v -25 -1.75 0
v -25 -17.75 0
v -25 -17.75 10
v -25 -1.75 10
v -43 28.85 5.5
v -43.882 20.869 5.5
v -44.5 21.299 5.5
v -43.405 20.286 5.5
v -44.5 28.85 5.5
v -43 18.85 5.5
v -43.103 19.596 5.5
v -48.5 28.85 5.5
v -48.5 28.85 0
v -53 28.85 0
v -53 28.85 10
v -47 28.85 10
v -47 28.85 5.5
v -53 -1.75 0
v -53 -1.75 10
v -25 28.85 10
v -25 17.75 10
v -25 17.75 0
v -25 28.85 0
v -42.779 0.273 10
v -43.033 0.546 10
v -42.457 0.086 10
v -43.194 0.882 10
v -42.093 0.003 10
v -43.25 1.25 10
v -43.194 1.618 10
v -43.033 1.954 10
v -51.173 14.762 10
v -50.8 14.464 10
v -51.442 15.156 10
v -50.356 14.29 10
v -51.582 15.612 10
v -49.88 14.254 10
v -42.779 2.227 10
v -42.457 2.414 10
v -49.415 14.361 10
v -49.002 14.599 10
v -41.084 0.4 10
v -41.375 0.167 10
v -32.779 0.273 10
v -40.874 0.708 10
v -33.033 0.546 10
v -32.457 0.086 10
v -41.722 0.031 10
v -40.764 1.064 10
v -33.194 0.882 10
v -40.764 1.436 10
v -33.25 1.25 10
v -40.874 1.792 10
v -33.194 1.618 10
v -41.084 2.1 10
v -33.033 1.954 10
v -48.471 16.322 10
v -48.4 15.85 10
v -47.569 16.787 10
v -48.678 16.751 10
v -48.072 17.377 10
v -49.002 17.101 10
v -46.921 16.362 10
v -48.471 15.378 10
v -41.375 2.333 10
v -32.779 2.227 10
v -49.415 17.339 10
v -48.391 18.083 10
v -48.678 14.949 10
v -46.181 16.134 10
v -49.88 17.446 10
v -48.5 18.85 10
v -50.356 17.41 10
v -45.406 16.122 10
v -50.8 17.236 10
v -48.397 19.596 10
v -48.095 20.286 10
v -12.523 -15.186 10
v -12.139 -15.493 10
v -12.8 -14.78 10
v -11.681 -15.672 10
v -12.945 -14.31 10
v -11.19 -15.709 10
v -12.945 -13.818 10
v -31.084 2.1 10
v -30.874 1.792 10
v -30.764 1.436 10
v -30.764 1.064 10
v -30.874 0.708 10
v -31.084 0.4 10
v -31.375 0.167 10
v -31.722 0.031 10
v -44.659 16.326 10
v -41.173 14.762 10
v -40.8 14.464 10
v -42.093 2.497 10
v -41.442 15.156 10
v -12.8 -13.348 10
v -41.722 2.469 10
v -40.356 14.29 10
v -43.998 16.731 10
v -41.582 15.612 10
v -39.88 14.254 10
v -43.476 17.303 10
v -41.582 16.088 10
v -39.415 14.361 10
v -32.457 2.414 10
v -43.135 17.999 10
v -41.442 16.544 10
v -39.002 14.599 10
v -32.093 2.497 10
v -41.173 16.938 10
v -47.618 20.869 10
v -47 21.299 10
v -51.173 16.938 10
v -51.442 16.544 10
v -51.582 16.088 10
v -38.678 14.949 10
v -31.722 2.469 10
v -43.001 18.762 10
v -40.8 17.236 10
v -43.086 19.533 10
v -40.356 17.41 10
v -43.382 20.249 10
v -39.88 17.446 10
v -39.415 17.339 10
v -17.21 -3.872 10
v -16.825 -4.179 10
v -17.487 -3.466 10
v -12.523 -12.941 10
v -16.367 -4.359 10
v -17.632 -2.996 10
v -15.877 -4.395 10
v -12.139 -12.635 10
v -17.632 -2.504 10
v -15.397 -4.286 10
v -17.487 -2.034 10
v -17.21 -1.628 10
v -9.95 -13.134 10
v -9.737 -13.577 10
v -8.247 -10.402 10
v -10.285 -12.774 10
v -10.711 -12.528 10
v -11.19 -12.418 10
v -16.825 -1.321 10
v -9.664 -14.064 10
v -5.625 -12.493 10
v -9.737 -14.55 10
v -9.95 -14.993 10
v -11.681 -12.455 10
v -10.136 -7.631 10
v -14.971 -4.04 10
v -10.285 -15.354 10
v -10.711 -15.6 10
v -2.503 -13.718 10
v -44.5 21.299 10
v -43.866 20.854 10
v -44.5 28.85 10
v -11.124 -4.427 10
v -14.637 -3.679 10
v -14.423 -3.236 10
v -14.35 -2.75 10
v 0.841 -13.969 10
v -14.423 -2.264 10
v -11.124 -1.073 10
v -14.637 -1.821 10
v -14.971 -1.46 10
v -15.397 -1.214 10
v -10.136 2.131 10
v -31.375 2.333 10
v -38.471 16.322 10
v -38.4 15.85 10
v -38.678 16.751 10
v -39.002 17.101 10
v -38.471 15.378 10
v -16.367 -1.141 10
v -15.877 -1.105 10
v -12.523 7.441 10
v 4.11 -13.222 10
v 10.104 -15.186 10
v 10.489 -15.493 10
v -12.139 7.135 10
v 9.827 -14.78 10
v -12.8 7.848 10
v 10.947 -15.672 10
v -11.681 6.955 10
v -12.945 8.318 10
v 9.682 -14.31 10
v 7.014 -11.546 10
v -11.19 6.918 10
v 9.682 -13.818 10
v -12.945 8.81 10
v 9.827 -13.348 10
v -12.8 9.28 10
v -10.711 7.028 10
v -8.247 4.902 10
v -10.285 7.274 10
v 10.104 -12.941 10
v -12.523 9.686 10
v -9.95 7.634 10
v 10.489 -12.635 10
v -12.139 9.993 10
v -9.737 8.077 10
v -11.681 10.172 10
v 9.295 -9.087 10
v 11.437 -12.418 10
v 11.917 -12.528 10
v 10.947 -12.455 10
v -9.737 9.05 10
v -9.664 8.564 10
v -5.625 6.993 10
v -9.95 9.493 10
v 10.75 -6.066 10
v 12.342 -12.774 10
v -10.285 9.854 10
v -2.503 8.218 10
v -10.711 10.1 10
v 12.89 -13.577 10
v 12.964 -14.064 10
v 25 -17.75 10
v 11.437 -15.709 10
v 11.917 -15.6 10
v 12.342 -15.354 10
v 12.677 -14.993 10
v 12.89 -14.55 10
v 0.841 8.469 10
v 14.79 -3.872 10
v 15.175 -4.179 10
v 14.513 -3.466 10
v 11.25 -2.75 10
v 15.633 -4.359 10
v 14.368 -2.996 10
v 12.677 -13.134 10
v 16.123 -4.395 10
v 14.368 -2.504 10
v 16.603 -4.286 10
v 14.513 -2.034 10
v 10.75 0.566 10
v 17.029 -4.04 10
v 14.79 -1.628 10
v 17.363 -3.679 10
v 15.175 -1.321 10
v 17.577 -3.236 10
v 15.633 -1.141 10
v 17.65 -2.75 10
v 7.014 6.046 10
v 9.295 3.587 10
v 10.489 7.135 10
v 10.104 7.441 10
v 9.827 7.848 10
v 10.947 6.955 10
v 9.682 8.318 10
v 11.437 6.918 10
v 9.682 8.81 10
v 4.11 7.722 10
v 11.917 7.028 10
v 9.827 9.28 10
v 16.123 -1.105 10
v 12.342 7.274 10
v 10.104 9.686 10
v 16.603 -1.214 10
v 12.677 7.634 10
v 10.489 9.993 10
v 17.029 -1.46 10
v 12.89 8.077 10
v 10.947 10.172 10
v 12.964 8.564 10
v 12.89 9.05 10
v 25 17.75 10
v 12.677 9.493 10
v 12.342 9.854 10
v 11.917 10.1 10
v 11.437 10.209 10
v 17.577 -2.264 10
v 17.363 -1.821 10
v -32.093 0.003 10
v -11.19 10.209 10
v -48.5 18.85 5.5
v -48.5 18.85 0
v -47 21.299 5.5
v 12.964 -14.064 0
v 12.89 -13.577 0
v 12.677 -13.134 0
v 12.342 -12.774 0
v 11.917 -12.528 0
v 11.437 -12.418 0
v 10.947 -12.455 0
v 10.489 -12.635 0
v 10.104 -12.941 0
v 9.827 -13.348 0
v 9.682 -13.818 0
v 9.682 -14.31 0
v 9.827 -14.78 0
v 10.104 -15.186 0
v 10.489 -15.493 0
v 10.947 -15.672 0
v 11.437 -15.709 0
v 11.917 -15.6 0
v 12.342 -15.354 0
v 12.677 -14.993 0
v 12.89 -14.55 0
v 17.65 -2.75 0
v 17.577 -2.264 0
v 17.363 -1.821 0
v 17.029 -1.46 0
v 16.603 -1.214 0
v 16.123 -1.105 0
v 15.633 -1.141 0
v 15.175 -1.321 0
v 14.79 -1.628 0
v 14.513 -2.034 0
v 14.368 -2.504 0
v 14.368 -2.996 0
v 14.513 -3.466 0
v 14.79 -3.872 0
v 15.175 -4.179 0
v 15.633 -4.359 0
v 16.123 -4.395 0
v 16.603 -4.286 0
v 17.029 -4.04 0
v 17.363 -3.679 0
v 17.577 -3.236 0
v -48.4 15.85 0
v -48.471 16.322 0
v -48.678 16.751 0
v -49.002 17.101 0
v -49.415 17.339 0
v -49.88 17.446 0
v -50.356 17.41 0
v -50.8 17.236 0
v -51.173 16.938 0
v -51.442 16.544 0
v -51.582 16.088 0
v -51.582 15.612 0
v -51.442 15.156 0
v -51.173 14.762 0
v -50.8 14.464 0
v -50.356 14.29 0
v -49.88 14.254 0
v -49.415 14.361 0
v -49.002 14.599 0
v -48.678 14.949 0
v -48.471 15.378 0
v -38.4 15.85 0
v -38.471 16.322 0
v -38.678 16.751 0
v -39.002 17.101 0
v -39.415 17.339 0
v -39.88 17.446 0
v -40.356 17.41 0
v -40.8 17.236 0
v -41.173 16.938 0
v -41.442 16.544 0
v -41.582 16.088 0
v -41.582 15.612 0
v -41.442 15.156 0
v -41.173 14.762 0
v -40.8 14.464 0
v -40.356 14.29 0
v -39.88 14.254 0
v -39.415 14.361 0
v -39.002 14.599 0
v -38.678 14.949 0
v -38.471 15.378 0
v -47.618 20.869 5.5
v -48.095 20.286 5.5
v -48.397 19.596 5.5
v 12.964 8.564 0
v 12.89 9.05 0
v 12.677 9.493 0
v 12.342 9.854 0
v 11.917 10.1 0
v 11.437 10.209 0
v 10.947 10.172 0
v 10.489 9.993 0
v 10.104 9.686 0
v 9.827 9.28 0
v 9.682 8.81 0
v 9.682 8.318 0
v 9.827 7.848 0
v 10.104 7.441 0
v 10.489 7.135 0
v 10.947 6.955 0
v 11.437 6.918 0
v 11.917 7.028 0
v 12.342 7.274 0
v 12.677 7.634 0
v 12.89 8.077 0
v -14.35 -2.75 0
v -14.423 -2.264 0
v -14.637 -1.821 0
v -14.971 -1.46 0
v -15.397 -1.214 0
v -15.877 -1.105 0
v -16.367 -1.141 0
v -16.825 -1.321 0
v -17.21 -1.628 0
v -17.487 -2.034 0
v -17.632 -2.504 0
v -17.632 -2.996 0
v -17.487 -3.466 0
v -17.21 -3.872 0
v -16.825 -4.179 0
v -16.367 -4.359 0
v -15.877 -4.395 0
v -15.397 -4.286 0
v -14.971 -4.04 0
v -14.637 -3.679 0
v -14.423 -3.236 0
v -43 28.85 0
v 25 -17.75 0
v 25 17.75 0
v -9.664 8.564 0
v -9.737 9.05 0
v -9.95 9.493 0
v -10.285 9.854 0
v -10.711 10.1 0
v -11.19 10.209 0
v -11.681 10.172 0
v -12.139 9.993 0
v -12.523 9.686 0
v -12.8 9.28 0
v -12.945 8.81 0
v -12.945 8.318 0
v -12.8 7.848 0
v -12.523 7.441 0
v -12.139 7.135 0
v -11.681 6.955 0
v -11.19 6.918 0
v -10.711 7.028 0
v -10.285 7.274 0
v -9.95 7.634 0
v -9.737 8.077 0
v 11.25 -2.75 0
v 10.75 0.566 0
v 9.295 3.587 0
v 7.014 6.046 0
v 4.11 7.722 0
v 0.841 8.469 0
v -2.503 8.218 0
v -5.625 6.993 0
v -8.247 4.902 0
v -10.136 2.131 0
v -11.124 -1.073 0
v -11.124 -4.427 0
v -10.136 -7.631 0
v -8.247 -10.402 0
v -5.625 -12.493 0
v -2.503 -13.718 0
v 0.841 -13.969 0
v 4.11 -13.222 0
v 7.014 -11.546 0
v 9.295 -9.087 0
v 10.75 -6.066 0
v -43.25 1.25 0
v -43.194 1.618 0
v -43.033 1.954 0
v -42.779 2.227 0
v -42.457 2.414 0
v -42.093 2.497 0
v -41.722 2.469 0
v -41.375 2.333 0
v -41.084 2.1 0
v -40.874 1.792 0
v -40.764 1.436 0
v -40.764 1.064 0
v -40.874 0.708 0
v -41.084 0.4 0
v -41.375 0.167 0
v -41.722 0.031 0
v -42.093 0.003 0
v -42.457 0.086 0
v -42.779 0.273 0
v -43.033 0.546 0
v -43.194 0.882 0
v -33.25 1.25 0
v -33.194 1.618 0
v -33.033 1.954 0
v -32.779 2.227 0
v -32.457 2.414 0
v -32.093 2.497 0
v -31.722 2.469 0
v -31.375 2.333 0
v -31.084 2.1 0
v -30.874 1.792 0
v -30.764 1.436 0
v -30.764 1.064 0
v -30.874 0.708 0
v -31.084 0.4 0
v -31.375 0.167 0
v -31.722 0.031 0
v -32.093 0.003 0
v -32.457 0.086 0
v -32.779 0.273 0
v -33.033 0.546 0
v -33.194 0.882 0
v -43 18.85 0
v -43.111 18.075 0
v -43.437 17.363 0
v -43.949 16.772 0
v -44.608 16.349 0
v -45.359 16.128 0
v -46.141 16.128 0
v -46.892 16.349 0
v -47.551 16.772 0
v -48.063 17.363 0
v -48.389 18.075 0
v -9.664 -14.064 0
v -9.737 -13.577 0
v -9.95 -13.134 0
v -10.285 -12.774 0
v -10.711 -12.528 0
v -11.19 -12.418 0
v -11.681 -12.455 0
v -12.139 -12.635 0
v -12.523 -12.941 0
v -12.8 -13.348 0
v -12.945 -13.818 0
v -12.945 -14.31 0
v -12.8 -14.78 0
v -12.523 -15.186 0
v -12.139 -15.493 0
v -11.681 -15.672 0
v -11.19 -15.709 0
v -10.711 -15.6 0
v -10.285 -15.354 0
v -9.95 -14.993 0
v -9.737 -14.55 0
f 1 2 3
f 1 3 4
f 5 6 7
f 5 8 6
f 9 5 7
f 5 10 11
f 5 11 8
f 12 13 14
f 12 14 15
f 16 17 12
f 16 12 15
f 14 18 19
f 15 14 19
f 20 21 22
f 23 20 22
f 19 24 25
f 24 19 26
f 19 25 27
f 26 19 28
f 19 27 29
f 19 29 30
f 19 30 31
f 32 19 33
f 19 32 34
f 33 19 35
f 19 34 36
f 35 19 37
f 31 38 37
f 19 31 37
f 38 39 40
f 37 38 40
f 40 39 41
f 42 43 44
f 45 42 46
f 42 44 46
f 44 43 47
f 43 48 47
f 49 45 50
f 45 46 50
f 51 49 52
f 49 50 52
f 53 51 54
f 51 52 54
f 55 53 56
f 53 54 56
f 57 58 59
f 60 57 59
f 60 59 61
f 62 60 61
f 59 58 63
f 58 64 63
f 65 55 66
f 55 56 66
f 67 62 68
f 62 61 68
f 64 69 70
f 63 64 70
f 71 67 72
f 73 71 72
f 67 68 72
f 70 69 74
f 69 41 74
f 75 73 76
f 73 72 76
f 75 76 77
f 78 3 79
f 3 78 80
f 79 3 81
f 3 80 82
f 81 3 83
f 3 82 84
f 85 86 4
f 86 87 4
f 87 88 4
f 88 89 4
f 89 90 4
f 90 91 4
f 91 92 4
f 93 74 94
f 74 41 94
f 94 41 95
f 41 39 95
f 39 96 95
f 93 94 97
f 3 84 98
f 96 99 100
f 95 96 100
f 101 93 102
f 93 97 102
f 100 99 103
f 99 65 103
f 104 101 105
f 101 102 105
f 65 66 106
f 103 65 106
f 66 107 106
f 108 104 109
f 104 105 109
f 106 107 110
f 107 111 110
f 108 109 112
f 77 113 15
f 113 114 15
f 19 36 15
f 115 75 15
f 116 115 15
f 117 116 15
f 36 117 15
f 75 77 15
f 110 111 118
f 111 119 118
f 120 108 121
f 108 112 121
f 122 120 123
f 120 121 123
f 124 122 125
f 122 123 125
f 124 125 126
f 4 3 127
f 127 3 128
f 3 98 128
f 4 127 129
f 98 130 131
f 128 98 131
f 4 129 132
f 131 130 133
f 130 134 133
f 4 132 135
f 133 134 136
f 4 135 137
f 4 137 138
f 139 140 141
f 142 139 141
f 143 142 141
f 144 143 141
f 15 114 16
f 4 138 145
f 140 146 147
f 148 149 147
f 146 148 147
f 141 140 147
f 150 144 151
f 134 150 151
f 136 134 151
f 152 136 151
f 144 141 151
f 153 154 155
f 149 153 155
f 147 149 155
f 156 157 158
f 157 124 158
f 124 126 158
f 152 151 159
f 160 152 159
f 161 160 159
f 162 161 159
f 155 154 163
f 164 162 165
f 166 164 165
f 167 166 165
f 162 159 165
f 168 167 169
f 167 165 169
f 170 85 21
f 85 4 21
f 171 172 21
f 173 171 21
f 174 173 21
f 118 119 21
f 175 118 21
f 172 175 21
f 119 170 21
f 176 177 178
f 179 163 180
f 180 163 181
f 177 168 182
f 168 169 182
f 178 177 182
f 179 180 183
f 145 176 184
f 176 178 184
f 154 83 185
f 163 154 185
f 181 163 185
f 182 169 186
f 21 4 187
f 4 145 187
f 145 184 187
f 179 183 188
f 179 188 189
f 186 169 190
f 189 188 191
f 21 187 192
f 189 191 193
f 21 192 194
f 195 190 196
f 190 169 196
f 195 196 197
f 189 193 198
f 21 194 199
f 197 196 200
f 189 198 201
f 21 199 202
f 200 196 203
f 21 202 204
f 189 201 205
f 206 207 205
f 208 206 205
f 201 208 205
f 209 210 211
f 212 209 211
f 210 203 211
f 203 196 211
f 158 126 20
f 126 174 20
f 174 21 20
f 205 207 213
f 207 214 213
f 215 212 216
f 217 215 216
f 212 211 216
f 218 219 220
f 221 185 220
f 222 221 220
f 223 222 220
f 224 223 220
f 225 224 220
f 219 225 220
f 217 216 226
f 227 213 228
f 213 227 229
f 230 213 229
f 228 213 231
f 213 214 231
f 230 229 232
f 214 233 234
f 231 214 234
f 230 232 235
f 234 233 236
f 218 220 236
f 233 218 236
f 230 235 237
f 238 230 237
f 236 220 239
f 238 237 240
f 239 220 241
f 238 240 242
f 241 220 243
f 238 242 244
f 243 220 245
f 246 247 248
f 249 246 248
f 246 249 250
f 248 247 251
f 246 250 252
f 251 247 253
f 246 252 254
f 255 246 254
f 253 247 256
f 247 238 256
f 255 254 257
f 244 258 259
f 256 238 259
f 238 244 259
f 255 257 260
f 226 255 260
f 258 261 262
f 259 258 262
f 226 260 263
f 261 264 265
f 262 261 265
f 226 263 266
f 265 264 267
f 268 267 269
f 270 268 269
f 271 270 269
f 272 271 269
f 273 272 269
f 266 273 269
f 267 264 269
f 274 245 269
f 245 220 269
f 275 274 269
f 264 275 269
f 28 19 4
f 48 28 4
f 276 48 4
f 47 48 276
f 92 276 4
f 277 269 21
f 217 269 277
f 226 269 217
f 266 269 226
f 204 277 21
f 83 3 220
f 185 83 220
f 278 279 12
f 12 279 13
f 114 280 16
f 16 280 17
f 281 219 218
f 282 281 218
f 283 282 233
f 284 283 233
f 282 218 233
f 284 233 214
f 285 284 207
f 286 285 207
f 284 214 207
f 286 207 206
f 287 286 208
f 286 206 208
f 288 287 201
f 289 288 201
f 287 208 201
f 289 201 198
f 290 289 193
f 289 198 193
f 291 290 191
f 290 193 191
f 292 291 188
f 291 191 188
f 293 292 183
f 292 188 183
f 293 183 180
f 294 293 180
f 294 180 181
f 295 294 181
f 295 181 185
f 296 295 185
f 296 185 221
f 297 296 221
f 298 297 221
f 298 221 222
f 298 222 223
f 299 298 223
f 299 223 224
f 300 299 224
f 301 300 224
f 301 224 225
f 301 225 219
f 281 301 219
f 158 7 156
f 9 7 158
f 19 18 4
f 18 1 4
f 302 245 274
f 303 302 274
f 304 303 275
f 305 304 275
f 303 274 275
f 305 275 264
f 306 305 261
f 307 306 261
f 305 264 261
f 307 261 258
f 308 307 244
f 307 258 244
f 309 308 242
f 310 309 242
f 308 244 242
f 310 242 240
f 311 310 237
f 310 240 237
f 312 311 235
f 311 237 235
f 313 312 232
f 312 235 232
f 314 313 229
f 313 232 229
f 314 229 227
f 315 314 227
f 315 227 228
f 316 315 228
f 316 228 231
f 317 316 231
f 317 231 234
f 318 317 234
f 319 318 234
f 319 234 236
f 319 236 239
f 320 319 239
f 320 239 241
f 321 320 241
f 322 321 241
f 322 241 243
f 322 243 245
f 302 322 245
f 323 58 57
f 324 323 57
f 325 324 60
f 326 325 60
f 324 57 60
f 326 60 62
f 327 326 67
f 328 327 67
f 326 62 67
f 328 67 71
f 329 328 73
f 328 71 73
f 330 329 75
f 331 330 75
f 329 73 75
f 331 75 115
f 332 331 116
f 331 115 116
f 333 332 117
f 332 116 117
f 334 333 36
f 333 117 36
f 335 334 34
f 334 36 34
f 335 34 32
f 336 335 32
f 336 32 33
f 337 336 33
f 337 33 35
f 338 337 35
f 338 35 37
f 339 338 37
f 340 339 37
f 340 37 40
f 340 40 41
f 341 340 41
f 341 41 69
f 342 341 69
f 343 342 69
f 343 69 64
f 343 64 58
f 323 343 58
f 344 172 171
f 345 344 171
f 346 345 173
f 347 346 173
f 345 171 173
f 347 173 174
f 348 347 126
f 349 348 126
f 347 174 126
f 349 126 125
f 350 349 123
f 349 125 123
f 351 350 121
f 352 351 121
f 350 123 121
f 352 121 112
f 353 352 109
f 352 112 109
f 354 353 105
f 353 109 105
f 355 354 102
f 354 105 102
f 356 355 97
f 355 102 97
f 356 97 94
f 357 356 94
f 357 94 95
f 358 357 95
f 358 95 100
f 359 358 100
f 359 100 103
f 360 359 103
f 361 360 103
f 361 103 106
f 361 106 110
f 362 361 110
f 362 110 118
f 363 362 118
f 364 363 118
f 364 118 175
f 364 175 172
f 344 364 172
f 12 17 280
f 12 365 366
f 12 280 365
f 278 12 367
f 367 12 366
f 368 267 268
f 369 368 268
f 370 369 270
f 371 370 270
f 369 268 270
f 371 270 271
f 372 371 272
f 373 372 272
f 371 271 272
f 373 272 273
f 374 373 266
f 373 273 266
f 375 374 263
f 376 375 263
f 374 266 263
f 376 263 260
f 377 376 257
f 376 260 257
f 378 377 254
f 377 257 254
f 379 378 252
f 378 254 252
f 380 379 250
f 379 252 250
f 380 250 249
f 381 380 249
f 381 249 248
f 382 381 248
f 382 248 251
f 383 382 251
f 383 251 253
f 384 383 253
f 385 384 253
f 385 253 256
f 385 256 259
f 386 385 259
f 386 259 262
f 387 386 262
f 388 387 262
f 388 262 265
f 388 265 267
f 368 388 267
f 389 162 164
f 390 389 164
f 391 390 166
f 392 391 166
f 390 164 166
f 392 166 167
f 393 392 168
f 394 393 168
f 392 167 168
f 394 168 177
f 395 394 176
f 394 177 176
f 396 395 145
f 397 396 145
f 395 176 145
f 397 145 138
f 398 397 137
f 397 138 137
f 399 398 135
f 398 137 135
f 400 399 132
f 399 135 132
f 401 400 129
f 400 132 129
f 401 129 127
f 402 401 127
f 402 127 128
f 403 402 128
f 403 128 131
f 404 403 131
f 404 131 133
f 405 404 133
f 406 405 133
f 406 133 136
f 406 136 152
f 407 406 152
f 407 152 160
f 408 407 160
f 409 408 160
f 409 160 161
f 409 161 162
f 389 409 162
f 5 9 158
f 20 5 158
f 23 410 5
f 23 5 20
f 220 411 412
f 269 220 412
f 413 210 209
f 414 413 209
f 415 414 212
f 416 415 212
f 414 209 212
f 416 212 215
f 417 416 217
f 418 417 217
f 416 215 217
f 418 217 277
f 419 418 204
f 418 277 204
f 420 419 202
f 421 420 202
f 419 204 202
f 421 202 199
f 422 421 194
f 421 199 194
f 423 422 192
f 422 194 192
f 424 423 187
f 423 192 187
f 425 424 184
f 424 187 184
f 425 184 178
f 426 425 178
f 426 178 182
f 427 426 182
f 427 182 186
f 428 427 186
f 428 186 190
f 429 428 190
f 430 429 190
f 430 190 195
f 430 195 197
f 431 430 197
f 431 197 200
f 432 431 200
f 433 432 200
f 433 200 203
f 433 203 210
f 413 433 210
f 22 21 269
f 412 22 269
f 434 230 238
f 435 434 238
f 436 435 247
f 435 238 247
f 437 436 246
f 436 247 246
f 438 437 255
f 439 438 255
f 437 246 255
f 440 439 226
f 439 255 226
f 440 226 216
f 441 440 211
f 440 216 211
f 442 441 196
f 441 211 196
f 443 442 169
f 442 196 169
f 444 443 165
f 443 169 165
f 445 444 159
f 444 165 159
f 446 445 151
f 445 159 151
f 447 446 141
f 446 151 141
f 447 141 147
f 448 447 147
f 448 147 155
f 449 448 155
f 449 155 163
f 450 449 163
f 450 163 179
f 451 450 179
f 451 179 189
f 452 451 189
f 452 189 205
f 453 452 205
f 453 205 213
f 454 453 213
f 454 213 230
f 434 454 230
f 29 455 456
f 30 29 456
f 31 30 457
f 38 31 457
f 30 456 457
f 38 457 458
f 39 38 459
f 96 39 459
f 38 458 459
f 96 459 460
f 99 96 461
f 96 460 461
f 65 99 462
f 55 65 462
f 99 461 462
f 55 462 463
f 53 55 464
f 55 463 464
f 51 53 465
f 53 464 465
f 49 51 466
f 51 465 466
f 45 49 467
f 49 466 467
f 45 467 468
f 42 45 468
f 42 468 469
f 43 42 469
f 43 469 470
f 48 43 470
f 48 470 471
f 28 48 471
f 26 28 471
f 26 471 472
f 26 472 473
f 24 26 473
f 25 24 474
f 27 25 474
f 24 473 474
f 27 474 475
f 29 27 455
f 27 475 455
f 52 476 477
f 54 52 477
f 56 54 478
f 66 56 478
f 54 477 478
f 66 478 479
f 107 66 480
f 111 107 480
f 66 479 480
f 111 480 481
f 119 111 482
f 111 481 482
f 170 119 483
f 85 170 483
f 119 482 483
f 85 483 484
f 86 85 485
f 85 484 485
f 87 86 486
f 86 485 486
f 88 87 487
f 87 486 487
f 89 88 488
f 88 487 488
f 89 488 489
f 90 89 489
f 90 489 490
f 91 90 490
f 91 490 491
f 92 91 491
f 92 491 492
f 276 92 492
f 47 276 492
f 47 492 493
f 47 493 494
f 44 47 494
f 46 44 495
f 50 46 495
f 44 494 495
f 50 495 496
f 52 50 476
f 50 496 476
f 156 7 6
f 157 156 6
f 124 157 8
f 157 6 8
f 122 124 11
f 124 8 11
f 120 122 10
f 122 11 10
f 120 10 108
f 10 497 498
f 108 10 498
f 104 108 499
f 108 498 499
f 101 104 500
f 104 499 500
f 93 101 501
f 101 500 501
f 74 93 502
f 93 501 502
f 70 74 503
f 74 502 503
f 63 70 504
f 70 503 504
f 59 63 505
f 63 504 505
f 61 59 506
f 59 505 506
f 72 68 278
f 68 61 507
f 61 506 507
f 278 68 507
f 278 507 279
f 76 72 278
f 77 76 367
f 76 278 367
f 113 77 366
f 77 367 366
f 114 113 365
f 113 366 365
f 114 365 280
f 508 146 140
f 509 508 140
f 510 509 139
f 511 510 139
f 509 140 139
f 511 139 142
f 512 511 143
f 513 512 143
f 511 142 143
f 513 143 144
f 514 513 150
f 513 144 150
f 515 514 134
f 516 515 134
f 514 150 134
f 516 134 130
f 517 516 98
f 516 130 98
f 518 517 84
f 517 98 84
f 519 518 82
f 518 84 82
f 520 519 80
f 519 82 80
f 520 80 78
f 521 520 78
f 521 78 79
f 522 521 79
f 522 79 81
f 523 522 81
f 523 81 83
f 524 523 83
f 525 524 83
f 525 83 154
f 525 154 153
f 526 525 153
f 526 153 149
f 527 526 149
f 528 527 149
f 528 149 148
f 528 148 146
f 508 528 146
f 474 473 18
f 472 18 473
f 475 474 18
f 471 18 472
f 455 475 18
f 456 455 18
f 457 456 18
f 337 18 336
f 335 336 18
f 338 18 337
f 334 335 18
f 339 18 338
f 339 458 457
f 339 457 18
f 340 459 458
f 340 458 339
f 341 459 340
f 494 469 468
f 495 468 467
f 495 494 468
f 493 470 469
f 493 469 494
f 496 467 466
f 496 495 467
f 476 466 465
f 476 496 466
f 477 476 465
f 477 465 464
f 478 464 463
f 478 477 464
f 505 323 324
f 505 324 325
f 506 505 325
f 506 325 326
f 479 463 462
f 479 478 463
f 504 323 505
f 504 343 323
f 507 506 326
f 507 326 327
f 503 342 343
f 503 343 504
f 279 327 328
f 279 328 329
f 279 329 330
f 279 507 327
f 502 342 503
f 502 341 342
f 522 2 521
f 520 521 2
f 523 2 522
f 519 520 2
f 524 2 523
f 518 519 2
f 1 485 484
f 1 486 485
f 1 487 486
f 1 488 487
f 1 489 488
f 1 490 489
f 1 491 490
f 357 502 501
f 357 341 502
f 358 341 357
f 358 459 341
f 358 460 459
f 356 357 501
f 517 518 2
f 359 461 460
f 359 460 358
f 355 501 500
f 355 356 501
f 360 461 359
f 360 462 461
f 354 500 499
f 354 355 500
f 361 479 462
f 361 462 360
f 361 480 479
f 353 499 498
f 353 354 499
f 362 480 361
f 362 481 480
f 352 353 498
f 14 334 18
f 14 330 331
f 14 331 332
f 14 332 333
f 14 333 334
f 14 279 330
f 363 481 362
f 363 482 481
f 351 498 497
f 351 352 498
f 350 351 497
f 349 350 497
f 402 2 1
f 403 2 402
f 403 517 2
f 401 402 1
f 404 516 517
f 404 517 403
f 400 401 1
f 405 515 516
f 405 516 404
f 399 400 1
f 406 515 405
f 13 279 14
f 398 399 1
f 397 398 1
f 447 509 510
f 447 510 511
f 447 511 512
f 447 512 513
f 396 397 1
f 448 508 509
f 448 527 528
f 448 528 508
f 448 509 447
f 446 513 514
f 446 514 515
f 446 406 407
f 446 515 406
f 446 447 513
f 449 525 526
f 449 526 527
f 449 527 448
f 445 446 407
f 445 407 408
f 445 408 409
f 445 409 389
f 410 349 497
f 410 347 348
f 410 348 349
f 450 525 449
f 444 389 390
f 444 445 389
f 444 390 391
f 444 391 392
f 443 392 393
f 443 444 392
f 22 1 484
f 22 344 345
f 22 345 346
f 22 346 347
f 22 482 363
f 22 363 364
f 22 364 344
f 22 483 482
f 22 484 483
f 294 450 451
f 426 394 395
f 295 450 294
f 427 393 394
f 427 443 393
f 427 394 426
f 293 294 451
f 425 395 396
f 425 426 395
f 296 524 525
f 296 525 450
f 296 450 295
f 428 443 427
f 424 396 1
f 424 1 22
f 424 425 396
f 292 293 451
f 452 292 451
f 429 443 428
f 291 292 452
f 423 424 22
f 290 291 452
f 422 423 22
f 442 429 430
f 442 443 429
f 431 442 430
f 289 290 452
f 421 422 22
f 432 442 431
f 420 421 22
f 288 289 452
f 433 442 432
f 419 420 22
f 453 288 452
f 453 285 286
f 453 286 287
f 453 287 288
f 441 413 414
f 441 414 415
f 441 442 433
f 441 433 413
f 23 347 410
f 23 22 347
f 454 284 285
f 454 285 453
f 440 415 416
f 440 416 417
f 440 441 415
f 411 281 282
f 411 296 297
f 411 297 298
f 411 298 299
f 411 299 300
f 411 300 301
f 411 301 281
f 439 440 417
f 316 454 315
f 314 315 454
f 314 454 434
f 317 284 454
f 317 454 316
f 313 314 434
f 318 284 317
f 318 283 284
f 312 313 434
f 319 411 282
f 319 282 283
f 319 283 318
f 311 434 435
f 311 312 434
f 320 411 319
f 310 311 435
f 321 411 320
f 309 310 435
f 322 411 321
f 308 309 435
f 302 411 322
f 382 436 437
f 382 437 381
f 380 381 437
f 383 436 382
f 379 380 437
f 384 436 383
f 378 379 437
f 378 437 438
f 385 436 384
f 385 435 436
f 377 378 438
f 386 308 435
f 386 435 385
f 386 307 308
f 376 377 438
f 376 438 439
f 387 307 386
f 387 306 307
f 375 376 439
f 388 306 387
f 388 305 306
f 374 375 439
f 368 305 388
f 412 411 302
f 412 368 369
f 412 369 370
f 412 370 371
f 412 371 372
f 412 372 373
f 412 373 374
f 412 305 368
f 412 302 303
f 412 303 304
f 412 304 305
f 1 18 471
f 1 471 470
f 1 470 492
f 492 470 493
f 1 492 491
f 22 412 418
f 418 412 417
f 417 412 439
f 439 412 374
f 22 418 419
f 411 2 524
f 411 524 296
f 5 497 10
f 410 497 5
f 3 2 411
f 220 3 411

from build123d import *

# Parameters (mm, degrees)
SKETCH_1_W          = 50
SKETCH_1_H          = 35.5
EXTRUDE_1_DEPTH     = 10
SKETCH_2_R          = 11.25
CUT_EXTRUDE_1_DEPTH = 33.25
SKETCH_3_R          = 1.65
CUT_EXTRUDE_2_DEPTH = 33.25
SKETCH_4_W          = 25
SKETCH_4_H          = 19.5
EXTRUDE_2_DEPTH     = 10
SKETCH_5_R          = 1.25
CUT_EXTRUDE_3_DEPTH = 10
SKETCH_7_W          = 25
SKETCH_7_H          = 10
EXTRUDE_4_DEPTH     = 11.1
SKETCH_8_W          = 2.5
SKETCH_8_H          = 10
CUT_EXTRUDE_4_DEPTH = 59.586026491
SKETCH_9_W          = 5.5
SKETCH_9_H          = 10
CUT_EXTRUDE_5_DEPTH = 5.5
SKETCH_10_W         = 10
SKETCH_10_H         = 30.6
EXTRUDE_5_DEPTH     = 3
SKETCH_11_R         = 2.75
CUT_EXTRUDE_6_DEPTH = 62.166351044
SKETCH_13_R         = 1.6
CUT_EXTRUDE_8_DEPTH = 62.166351044


with BuildPart() as part:
    # 草图1 → 凸台-拉伸1 (new body)
    with BuildSketch(Plane.XY):
        Rectangle(SKETCH_1_W, SKETCH_1_H)
    extrude(amount=EXTRUDE_1_DEPTH)

    # 草图2 → 切除-拉伸1 (cut, through all)
    with BuildSketch(Plane.XY.offset(10)):
        with Locations((0, -2.75)):
            Circle(SKETCH_2_R)
    extrude(amount=-CUT_EXTRUDE_1_DEPTH, mode=Mode.SUBTRACT)

    # 草图3 → 切除-拉伸2 (cut, through all)
    with BuildSketch(Plane.XY.offset(10)):
        with Locations((-16, -2.75)):
            Circle(SKETCH_3_R)
        with Locations((-11.313708499, 8.563708499)):
            Circle(SKETCH_3_R)
        with Locations((11.313708499, 8.563708499)):
            Circle(SKETCH_3_R)
        with Locations((16, -2.75)):
            Circle(SKETCH_3_R)
        with Locations((11.313708499, -14.063708499)):
            Circle(SKETCH_3_R)
        with Locations((-11.313708499, -14.063708499)):
            Circle(SKETCH_3_R)
    extrude(amount=-CUT_EXTRUDE_2_DEPTH, mode=Mode.SUBTRACT)

    # 草图4 → 凸台-拉伸2 (add)
    with BuildSketch(Plane.XY.offset(10)):
        with Locations((-37.5, 8)):
            Rectangle(SKETCH_4_W, SKETCH_4_H)
    extrude(amount=-EXTRUDE_2_DEPTH)

    # 草图5 → 切除-拉伸3 (cut)
    with BuildSketch(Plane(origin=(0, 0, 0), x_dir=(-1, 0, 0), z_dir=(0, 0, -1))):
        with Locations((42, 1.25)):
            Circle(SKETCH_5_R)
        with Locations((32, 1.25)):
            Circle(SKETCH_5_R)
    extrude(amount=-CUT_EXTRUDE_3_DEPTH, mode=Mode.SUBTRACT)

    # 草图7 → 凸台-拉伸4 (add)
    with BuildSketch(Plane(origin=(0, 17.75, 0), x_dir=(1, 0, 0), z_dir=(0, 1, 0))):
        with Locations((-37.5, -5)):
            Rectangle(SKETCH_7_W, SKETCH_7_H)
    extrude(amount=EXTRUDE_4_DEPTH)

    # 草图8 → 切除-拉伸4 (cut, through all)
    with BuildSketch(Plane(origin=(0, 0, 0), x_dir=(-1, 0, 0), z_dir=(0, 0, -1))):
        with Locations((45.75, 23.85)):
            Rectangle(SKETCH_8_W, SKETCH_8_H)
    extrude(amount=-CUT_EXTRUDE_4_DEPTH, mode=Mode.SUBTRACT)

    # 草图9 → 切除-拉伸5 (cut)
    with BuildSketch(Plane(origin=(0, 0, 0), x_dir=(-1, 0, 0), z_dir=(0, 0, -1))):
        with Locations((45.75, 23.85)):
            Rectangle(SKETCH_9_W, SKETCH_9_H)
    extrude(amount=-CUT_EXTRUDE_5_DEPTH, mode=Mode.SUBTRACT)

    # 草图10 → 凸台-拉伸5 (add)
    with BuildSketch(Plane.ZY.offset(50)):
        with Locations((5, 13.55)):
            Rectangle(SKETCH_10_W, SKETCH_10_H)
    extrude(amount=EXTRUDE_5_DEPTH)

    # 草图11 → 切除-拉伸6 (cut, through all)
    with BuildSketch(Plane(origin=(0, 0, 0), x_dir=(-1, 0, 0), z_dir=(0, 0, -1))):
        with Locations((45.75, 18.85)):
            Circle(SKETCH_11_R)
    extrude(amount=-CUT_EXTRUDE_6_DEPTH, mode=Mode.SUBTRACT)

    # 草图13 → 切除-拉伸8 (cut, through all)
    with BuildSketch(Plane.XY.offset(10)):
        with Locations((-50, 15.85)):
            Circle(SKETCH_13_R)
        with Locations((-40, 15.85)):
            Circle(SKETCH_13_R)
    extrude(amount=-CUT_EXTRUDE_8_DEPTH, mode=Mode.SUBTRACT)


solid = part.part
